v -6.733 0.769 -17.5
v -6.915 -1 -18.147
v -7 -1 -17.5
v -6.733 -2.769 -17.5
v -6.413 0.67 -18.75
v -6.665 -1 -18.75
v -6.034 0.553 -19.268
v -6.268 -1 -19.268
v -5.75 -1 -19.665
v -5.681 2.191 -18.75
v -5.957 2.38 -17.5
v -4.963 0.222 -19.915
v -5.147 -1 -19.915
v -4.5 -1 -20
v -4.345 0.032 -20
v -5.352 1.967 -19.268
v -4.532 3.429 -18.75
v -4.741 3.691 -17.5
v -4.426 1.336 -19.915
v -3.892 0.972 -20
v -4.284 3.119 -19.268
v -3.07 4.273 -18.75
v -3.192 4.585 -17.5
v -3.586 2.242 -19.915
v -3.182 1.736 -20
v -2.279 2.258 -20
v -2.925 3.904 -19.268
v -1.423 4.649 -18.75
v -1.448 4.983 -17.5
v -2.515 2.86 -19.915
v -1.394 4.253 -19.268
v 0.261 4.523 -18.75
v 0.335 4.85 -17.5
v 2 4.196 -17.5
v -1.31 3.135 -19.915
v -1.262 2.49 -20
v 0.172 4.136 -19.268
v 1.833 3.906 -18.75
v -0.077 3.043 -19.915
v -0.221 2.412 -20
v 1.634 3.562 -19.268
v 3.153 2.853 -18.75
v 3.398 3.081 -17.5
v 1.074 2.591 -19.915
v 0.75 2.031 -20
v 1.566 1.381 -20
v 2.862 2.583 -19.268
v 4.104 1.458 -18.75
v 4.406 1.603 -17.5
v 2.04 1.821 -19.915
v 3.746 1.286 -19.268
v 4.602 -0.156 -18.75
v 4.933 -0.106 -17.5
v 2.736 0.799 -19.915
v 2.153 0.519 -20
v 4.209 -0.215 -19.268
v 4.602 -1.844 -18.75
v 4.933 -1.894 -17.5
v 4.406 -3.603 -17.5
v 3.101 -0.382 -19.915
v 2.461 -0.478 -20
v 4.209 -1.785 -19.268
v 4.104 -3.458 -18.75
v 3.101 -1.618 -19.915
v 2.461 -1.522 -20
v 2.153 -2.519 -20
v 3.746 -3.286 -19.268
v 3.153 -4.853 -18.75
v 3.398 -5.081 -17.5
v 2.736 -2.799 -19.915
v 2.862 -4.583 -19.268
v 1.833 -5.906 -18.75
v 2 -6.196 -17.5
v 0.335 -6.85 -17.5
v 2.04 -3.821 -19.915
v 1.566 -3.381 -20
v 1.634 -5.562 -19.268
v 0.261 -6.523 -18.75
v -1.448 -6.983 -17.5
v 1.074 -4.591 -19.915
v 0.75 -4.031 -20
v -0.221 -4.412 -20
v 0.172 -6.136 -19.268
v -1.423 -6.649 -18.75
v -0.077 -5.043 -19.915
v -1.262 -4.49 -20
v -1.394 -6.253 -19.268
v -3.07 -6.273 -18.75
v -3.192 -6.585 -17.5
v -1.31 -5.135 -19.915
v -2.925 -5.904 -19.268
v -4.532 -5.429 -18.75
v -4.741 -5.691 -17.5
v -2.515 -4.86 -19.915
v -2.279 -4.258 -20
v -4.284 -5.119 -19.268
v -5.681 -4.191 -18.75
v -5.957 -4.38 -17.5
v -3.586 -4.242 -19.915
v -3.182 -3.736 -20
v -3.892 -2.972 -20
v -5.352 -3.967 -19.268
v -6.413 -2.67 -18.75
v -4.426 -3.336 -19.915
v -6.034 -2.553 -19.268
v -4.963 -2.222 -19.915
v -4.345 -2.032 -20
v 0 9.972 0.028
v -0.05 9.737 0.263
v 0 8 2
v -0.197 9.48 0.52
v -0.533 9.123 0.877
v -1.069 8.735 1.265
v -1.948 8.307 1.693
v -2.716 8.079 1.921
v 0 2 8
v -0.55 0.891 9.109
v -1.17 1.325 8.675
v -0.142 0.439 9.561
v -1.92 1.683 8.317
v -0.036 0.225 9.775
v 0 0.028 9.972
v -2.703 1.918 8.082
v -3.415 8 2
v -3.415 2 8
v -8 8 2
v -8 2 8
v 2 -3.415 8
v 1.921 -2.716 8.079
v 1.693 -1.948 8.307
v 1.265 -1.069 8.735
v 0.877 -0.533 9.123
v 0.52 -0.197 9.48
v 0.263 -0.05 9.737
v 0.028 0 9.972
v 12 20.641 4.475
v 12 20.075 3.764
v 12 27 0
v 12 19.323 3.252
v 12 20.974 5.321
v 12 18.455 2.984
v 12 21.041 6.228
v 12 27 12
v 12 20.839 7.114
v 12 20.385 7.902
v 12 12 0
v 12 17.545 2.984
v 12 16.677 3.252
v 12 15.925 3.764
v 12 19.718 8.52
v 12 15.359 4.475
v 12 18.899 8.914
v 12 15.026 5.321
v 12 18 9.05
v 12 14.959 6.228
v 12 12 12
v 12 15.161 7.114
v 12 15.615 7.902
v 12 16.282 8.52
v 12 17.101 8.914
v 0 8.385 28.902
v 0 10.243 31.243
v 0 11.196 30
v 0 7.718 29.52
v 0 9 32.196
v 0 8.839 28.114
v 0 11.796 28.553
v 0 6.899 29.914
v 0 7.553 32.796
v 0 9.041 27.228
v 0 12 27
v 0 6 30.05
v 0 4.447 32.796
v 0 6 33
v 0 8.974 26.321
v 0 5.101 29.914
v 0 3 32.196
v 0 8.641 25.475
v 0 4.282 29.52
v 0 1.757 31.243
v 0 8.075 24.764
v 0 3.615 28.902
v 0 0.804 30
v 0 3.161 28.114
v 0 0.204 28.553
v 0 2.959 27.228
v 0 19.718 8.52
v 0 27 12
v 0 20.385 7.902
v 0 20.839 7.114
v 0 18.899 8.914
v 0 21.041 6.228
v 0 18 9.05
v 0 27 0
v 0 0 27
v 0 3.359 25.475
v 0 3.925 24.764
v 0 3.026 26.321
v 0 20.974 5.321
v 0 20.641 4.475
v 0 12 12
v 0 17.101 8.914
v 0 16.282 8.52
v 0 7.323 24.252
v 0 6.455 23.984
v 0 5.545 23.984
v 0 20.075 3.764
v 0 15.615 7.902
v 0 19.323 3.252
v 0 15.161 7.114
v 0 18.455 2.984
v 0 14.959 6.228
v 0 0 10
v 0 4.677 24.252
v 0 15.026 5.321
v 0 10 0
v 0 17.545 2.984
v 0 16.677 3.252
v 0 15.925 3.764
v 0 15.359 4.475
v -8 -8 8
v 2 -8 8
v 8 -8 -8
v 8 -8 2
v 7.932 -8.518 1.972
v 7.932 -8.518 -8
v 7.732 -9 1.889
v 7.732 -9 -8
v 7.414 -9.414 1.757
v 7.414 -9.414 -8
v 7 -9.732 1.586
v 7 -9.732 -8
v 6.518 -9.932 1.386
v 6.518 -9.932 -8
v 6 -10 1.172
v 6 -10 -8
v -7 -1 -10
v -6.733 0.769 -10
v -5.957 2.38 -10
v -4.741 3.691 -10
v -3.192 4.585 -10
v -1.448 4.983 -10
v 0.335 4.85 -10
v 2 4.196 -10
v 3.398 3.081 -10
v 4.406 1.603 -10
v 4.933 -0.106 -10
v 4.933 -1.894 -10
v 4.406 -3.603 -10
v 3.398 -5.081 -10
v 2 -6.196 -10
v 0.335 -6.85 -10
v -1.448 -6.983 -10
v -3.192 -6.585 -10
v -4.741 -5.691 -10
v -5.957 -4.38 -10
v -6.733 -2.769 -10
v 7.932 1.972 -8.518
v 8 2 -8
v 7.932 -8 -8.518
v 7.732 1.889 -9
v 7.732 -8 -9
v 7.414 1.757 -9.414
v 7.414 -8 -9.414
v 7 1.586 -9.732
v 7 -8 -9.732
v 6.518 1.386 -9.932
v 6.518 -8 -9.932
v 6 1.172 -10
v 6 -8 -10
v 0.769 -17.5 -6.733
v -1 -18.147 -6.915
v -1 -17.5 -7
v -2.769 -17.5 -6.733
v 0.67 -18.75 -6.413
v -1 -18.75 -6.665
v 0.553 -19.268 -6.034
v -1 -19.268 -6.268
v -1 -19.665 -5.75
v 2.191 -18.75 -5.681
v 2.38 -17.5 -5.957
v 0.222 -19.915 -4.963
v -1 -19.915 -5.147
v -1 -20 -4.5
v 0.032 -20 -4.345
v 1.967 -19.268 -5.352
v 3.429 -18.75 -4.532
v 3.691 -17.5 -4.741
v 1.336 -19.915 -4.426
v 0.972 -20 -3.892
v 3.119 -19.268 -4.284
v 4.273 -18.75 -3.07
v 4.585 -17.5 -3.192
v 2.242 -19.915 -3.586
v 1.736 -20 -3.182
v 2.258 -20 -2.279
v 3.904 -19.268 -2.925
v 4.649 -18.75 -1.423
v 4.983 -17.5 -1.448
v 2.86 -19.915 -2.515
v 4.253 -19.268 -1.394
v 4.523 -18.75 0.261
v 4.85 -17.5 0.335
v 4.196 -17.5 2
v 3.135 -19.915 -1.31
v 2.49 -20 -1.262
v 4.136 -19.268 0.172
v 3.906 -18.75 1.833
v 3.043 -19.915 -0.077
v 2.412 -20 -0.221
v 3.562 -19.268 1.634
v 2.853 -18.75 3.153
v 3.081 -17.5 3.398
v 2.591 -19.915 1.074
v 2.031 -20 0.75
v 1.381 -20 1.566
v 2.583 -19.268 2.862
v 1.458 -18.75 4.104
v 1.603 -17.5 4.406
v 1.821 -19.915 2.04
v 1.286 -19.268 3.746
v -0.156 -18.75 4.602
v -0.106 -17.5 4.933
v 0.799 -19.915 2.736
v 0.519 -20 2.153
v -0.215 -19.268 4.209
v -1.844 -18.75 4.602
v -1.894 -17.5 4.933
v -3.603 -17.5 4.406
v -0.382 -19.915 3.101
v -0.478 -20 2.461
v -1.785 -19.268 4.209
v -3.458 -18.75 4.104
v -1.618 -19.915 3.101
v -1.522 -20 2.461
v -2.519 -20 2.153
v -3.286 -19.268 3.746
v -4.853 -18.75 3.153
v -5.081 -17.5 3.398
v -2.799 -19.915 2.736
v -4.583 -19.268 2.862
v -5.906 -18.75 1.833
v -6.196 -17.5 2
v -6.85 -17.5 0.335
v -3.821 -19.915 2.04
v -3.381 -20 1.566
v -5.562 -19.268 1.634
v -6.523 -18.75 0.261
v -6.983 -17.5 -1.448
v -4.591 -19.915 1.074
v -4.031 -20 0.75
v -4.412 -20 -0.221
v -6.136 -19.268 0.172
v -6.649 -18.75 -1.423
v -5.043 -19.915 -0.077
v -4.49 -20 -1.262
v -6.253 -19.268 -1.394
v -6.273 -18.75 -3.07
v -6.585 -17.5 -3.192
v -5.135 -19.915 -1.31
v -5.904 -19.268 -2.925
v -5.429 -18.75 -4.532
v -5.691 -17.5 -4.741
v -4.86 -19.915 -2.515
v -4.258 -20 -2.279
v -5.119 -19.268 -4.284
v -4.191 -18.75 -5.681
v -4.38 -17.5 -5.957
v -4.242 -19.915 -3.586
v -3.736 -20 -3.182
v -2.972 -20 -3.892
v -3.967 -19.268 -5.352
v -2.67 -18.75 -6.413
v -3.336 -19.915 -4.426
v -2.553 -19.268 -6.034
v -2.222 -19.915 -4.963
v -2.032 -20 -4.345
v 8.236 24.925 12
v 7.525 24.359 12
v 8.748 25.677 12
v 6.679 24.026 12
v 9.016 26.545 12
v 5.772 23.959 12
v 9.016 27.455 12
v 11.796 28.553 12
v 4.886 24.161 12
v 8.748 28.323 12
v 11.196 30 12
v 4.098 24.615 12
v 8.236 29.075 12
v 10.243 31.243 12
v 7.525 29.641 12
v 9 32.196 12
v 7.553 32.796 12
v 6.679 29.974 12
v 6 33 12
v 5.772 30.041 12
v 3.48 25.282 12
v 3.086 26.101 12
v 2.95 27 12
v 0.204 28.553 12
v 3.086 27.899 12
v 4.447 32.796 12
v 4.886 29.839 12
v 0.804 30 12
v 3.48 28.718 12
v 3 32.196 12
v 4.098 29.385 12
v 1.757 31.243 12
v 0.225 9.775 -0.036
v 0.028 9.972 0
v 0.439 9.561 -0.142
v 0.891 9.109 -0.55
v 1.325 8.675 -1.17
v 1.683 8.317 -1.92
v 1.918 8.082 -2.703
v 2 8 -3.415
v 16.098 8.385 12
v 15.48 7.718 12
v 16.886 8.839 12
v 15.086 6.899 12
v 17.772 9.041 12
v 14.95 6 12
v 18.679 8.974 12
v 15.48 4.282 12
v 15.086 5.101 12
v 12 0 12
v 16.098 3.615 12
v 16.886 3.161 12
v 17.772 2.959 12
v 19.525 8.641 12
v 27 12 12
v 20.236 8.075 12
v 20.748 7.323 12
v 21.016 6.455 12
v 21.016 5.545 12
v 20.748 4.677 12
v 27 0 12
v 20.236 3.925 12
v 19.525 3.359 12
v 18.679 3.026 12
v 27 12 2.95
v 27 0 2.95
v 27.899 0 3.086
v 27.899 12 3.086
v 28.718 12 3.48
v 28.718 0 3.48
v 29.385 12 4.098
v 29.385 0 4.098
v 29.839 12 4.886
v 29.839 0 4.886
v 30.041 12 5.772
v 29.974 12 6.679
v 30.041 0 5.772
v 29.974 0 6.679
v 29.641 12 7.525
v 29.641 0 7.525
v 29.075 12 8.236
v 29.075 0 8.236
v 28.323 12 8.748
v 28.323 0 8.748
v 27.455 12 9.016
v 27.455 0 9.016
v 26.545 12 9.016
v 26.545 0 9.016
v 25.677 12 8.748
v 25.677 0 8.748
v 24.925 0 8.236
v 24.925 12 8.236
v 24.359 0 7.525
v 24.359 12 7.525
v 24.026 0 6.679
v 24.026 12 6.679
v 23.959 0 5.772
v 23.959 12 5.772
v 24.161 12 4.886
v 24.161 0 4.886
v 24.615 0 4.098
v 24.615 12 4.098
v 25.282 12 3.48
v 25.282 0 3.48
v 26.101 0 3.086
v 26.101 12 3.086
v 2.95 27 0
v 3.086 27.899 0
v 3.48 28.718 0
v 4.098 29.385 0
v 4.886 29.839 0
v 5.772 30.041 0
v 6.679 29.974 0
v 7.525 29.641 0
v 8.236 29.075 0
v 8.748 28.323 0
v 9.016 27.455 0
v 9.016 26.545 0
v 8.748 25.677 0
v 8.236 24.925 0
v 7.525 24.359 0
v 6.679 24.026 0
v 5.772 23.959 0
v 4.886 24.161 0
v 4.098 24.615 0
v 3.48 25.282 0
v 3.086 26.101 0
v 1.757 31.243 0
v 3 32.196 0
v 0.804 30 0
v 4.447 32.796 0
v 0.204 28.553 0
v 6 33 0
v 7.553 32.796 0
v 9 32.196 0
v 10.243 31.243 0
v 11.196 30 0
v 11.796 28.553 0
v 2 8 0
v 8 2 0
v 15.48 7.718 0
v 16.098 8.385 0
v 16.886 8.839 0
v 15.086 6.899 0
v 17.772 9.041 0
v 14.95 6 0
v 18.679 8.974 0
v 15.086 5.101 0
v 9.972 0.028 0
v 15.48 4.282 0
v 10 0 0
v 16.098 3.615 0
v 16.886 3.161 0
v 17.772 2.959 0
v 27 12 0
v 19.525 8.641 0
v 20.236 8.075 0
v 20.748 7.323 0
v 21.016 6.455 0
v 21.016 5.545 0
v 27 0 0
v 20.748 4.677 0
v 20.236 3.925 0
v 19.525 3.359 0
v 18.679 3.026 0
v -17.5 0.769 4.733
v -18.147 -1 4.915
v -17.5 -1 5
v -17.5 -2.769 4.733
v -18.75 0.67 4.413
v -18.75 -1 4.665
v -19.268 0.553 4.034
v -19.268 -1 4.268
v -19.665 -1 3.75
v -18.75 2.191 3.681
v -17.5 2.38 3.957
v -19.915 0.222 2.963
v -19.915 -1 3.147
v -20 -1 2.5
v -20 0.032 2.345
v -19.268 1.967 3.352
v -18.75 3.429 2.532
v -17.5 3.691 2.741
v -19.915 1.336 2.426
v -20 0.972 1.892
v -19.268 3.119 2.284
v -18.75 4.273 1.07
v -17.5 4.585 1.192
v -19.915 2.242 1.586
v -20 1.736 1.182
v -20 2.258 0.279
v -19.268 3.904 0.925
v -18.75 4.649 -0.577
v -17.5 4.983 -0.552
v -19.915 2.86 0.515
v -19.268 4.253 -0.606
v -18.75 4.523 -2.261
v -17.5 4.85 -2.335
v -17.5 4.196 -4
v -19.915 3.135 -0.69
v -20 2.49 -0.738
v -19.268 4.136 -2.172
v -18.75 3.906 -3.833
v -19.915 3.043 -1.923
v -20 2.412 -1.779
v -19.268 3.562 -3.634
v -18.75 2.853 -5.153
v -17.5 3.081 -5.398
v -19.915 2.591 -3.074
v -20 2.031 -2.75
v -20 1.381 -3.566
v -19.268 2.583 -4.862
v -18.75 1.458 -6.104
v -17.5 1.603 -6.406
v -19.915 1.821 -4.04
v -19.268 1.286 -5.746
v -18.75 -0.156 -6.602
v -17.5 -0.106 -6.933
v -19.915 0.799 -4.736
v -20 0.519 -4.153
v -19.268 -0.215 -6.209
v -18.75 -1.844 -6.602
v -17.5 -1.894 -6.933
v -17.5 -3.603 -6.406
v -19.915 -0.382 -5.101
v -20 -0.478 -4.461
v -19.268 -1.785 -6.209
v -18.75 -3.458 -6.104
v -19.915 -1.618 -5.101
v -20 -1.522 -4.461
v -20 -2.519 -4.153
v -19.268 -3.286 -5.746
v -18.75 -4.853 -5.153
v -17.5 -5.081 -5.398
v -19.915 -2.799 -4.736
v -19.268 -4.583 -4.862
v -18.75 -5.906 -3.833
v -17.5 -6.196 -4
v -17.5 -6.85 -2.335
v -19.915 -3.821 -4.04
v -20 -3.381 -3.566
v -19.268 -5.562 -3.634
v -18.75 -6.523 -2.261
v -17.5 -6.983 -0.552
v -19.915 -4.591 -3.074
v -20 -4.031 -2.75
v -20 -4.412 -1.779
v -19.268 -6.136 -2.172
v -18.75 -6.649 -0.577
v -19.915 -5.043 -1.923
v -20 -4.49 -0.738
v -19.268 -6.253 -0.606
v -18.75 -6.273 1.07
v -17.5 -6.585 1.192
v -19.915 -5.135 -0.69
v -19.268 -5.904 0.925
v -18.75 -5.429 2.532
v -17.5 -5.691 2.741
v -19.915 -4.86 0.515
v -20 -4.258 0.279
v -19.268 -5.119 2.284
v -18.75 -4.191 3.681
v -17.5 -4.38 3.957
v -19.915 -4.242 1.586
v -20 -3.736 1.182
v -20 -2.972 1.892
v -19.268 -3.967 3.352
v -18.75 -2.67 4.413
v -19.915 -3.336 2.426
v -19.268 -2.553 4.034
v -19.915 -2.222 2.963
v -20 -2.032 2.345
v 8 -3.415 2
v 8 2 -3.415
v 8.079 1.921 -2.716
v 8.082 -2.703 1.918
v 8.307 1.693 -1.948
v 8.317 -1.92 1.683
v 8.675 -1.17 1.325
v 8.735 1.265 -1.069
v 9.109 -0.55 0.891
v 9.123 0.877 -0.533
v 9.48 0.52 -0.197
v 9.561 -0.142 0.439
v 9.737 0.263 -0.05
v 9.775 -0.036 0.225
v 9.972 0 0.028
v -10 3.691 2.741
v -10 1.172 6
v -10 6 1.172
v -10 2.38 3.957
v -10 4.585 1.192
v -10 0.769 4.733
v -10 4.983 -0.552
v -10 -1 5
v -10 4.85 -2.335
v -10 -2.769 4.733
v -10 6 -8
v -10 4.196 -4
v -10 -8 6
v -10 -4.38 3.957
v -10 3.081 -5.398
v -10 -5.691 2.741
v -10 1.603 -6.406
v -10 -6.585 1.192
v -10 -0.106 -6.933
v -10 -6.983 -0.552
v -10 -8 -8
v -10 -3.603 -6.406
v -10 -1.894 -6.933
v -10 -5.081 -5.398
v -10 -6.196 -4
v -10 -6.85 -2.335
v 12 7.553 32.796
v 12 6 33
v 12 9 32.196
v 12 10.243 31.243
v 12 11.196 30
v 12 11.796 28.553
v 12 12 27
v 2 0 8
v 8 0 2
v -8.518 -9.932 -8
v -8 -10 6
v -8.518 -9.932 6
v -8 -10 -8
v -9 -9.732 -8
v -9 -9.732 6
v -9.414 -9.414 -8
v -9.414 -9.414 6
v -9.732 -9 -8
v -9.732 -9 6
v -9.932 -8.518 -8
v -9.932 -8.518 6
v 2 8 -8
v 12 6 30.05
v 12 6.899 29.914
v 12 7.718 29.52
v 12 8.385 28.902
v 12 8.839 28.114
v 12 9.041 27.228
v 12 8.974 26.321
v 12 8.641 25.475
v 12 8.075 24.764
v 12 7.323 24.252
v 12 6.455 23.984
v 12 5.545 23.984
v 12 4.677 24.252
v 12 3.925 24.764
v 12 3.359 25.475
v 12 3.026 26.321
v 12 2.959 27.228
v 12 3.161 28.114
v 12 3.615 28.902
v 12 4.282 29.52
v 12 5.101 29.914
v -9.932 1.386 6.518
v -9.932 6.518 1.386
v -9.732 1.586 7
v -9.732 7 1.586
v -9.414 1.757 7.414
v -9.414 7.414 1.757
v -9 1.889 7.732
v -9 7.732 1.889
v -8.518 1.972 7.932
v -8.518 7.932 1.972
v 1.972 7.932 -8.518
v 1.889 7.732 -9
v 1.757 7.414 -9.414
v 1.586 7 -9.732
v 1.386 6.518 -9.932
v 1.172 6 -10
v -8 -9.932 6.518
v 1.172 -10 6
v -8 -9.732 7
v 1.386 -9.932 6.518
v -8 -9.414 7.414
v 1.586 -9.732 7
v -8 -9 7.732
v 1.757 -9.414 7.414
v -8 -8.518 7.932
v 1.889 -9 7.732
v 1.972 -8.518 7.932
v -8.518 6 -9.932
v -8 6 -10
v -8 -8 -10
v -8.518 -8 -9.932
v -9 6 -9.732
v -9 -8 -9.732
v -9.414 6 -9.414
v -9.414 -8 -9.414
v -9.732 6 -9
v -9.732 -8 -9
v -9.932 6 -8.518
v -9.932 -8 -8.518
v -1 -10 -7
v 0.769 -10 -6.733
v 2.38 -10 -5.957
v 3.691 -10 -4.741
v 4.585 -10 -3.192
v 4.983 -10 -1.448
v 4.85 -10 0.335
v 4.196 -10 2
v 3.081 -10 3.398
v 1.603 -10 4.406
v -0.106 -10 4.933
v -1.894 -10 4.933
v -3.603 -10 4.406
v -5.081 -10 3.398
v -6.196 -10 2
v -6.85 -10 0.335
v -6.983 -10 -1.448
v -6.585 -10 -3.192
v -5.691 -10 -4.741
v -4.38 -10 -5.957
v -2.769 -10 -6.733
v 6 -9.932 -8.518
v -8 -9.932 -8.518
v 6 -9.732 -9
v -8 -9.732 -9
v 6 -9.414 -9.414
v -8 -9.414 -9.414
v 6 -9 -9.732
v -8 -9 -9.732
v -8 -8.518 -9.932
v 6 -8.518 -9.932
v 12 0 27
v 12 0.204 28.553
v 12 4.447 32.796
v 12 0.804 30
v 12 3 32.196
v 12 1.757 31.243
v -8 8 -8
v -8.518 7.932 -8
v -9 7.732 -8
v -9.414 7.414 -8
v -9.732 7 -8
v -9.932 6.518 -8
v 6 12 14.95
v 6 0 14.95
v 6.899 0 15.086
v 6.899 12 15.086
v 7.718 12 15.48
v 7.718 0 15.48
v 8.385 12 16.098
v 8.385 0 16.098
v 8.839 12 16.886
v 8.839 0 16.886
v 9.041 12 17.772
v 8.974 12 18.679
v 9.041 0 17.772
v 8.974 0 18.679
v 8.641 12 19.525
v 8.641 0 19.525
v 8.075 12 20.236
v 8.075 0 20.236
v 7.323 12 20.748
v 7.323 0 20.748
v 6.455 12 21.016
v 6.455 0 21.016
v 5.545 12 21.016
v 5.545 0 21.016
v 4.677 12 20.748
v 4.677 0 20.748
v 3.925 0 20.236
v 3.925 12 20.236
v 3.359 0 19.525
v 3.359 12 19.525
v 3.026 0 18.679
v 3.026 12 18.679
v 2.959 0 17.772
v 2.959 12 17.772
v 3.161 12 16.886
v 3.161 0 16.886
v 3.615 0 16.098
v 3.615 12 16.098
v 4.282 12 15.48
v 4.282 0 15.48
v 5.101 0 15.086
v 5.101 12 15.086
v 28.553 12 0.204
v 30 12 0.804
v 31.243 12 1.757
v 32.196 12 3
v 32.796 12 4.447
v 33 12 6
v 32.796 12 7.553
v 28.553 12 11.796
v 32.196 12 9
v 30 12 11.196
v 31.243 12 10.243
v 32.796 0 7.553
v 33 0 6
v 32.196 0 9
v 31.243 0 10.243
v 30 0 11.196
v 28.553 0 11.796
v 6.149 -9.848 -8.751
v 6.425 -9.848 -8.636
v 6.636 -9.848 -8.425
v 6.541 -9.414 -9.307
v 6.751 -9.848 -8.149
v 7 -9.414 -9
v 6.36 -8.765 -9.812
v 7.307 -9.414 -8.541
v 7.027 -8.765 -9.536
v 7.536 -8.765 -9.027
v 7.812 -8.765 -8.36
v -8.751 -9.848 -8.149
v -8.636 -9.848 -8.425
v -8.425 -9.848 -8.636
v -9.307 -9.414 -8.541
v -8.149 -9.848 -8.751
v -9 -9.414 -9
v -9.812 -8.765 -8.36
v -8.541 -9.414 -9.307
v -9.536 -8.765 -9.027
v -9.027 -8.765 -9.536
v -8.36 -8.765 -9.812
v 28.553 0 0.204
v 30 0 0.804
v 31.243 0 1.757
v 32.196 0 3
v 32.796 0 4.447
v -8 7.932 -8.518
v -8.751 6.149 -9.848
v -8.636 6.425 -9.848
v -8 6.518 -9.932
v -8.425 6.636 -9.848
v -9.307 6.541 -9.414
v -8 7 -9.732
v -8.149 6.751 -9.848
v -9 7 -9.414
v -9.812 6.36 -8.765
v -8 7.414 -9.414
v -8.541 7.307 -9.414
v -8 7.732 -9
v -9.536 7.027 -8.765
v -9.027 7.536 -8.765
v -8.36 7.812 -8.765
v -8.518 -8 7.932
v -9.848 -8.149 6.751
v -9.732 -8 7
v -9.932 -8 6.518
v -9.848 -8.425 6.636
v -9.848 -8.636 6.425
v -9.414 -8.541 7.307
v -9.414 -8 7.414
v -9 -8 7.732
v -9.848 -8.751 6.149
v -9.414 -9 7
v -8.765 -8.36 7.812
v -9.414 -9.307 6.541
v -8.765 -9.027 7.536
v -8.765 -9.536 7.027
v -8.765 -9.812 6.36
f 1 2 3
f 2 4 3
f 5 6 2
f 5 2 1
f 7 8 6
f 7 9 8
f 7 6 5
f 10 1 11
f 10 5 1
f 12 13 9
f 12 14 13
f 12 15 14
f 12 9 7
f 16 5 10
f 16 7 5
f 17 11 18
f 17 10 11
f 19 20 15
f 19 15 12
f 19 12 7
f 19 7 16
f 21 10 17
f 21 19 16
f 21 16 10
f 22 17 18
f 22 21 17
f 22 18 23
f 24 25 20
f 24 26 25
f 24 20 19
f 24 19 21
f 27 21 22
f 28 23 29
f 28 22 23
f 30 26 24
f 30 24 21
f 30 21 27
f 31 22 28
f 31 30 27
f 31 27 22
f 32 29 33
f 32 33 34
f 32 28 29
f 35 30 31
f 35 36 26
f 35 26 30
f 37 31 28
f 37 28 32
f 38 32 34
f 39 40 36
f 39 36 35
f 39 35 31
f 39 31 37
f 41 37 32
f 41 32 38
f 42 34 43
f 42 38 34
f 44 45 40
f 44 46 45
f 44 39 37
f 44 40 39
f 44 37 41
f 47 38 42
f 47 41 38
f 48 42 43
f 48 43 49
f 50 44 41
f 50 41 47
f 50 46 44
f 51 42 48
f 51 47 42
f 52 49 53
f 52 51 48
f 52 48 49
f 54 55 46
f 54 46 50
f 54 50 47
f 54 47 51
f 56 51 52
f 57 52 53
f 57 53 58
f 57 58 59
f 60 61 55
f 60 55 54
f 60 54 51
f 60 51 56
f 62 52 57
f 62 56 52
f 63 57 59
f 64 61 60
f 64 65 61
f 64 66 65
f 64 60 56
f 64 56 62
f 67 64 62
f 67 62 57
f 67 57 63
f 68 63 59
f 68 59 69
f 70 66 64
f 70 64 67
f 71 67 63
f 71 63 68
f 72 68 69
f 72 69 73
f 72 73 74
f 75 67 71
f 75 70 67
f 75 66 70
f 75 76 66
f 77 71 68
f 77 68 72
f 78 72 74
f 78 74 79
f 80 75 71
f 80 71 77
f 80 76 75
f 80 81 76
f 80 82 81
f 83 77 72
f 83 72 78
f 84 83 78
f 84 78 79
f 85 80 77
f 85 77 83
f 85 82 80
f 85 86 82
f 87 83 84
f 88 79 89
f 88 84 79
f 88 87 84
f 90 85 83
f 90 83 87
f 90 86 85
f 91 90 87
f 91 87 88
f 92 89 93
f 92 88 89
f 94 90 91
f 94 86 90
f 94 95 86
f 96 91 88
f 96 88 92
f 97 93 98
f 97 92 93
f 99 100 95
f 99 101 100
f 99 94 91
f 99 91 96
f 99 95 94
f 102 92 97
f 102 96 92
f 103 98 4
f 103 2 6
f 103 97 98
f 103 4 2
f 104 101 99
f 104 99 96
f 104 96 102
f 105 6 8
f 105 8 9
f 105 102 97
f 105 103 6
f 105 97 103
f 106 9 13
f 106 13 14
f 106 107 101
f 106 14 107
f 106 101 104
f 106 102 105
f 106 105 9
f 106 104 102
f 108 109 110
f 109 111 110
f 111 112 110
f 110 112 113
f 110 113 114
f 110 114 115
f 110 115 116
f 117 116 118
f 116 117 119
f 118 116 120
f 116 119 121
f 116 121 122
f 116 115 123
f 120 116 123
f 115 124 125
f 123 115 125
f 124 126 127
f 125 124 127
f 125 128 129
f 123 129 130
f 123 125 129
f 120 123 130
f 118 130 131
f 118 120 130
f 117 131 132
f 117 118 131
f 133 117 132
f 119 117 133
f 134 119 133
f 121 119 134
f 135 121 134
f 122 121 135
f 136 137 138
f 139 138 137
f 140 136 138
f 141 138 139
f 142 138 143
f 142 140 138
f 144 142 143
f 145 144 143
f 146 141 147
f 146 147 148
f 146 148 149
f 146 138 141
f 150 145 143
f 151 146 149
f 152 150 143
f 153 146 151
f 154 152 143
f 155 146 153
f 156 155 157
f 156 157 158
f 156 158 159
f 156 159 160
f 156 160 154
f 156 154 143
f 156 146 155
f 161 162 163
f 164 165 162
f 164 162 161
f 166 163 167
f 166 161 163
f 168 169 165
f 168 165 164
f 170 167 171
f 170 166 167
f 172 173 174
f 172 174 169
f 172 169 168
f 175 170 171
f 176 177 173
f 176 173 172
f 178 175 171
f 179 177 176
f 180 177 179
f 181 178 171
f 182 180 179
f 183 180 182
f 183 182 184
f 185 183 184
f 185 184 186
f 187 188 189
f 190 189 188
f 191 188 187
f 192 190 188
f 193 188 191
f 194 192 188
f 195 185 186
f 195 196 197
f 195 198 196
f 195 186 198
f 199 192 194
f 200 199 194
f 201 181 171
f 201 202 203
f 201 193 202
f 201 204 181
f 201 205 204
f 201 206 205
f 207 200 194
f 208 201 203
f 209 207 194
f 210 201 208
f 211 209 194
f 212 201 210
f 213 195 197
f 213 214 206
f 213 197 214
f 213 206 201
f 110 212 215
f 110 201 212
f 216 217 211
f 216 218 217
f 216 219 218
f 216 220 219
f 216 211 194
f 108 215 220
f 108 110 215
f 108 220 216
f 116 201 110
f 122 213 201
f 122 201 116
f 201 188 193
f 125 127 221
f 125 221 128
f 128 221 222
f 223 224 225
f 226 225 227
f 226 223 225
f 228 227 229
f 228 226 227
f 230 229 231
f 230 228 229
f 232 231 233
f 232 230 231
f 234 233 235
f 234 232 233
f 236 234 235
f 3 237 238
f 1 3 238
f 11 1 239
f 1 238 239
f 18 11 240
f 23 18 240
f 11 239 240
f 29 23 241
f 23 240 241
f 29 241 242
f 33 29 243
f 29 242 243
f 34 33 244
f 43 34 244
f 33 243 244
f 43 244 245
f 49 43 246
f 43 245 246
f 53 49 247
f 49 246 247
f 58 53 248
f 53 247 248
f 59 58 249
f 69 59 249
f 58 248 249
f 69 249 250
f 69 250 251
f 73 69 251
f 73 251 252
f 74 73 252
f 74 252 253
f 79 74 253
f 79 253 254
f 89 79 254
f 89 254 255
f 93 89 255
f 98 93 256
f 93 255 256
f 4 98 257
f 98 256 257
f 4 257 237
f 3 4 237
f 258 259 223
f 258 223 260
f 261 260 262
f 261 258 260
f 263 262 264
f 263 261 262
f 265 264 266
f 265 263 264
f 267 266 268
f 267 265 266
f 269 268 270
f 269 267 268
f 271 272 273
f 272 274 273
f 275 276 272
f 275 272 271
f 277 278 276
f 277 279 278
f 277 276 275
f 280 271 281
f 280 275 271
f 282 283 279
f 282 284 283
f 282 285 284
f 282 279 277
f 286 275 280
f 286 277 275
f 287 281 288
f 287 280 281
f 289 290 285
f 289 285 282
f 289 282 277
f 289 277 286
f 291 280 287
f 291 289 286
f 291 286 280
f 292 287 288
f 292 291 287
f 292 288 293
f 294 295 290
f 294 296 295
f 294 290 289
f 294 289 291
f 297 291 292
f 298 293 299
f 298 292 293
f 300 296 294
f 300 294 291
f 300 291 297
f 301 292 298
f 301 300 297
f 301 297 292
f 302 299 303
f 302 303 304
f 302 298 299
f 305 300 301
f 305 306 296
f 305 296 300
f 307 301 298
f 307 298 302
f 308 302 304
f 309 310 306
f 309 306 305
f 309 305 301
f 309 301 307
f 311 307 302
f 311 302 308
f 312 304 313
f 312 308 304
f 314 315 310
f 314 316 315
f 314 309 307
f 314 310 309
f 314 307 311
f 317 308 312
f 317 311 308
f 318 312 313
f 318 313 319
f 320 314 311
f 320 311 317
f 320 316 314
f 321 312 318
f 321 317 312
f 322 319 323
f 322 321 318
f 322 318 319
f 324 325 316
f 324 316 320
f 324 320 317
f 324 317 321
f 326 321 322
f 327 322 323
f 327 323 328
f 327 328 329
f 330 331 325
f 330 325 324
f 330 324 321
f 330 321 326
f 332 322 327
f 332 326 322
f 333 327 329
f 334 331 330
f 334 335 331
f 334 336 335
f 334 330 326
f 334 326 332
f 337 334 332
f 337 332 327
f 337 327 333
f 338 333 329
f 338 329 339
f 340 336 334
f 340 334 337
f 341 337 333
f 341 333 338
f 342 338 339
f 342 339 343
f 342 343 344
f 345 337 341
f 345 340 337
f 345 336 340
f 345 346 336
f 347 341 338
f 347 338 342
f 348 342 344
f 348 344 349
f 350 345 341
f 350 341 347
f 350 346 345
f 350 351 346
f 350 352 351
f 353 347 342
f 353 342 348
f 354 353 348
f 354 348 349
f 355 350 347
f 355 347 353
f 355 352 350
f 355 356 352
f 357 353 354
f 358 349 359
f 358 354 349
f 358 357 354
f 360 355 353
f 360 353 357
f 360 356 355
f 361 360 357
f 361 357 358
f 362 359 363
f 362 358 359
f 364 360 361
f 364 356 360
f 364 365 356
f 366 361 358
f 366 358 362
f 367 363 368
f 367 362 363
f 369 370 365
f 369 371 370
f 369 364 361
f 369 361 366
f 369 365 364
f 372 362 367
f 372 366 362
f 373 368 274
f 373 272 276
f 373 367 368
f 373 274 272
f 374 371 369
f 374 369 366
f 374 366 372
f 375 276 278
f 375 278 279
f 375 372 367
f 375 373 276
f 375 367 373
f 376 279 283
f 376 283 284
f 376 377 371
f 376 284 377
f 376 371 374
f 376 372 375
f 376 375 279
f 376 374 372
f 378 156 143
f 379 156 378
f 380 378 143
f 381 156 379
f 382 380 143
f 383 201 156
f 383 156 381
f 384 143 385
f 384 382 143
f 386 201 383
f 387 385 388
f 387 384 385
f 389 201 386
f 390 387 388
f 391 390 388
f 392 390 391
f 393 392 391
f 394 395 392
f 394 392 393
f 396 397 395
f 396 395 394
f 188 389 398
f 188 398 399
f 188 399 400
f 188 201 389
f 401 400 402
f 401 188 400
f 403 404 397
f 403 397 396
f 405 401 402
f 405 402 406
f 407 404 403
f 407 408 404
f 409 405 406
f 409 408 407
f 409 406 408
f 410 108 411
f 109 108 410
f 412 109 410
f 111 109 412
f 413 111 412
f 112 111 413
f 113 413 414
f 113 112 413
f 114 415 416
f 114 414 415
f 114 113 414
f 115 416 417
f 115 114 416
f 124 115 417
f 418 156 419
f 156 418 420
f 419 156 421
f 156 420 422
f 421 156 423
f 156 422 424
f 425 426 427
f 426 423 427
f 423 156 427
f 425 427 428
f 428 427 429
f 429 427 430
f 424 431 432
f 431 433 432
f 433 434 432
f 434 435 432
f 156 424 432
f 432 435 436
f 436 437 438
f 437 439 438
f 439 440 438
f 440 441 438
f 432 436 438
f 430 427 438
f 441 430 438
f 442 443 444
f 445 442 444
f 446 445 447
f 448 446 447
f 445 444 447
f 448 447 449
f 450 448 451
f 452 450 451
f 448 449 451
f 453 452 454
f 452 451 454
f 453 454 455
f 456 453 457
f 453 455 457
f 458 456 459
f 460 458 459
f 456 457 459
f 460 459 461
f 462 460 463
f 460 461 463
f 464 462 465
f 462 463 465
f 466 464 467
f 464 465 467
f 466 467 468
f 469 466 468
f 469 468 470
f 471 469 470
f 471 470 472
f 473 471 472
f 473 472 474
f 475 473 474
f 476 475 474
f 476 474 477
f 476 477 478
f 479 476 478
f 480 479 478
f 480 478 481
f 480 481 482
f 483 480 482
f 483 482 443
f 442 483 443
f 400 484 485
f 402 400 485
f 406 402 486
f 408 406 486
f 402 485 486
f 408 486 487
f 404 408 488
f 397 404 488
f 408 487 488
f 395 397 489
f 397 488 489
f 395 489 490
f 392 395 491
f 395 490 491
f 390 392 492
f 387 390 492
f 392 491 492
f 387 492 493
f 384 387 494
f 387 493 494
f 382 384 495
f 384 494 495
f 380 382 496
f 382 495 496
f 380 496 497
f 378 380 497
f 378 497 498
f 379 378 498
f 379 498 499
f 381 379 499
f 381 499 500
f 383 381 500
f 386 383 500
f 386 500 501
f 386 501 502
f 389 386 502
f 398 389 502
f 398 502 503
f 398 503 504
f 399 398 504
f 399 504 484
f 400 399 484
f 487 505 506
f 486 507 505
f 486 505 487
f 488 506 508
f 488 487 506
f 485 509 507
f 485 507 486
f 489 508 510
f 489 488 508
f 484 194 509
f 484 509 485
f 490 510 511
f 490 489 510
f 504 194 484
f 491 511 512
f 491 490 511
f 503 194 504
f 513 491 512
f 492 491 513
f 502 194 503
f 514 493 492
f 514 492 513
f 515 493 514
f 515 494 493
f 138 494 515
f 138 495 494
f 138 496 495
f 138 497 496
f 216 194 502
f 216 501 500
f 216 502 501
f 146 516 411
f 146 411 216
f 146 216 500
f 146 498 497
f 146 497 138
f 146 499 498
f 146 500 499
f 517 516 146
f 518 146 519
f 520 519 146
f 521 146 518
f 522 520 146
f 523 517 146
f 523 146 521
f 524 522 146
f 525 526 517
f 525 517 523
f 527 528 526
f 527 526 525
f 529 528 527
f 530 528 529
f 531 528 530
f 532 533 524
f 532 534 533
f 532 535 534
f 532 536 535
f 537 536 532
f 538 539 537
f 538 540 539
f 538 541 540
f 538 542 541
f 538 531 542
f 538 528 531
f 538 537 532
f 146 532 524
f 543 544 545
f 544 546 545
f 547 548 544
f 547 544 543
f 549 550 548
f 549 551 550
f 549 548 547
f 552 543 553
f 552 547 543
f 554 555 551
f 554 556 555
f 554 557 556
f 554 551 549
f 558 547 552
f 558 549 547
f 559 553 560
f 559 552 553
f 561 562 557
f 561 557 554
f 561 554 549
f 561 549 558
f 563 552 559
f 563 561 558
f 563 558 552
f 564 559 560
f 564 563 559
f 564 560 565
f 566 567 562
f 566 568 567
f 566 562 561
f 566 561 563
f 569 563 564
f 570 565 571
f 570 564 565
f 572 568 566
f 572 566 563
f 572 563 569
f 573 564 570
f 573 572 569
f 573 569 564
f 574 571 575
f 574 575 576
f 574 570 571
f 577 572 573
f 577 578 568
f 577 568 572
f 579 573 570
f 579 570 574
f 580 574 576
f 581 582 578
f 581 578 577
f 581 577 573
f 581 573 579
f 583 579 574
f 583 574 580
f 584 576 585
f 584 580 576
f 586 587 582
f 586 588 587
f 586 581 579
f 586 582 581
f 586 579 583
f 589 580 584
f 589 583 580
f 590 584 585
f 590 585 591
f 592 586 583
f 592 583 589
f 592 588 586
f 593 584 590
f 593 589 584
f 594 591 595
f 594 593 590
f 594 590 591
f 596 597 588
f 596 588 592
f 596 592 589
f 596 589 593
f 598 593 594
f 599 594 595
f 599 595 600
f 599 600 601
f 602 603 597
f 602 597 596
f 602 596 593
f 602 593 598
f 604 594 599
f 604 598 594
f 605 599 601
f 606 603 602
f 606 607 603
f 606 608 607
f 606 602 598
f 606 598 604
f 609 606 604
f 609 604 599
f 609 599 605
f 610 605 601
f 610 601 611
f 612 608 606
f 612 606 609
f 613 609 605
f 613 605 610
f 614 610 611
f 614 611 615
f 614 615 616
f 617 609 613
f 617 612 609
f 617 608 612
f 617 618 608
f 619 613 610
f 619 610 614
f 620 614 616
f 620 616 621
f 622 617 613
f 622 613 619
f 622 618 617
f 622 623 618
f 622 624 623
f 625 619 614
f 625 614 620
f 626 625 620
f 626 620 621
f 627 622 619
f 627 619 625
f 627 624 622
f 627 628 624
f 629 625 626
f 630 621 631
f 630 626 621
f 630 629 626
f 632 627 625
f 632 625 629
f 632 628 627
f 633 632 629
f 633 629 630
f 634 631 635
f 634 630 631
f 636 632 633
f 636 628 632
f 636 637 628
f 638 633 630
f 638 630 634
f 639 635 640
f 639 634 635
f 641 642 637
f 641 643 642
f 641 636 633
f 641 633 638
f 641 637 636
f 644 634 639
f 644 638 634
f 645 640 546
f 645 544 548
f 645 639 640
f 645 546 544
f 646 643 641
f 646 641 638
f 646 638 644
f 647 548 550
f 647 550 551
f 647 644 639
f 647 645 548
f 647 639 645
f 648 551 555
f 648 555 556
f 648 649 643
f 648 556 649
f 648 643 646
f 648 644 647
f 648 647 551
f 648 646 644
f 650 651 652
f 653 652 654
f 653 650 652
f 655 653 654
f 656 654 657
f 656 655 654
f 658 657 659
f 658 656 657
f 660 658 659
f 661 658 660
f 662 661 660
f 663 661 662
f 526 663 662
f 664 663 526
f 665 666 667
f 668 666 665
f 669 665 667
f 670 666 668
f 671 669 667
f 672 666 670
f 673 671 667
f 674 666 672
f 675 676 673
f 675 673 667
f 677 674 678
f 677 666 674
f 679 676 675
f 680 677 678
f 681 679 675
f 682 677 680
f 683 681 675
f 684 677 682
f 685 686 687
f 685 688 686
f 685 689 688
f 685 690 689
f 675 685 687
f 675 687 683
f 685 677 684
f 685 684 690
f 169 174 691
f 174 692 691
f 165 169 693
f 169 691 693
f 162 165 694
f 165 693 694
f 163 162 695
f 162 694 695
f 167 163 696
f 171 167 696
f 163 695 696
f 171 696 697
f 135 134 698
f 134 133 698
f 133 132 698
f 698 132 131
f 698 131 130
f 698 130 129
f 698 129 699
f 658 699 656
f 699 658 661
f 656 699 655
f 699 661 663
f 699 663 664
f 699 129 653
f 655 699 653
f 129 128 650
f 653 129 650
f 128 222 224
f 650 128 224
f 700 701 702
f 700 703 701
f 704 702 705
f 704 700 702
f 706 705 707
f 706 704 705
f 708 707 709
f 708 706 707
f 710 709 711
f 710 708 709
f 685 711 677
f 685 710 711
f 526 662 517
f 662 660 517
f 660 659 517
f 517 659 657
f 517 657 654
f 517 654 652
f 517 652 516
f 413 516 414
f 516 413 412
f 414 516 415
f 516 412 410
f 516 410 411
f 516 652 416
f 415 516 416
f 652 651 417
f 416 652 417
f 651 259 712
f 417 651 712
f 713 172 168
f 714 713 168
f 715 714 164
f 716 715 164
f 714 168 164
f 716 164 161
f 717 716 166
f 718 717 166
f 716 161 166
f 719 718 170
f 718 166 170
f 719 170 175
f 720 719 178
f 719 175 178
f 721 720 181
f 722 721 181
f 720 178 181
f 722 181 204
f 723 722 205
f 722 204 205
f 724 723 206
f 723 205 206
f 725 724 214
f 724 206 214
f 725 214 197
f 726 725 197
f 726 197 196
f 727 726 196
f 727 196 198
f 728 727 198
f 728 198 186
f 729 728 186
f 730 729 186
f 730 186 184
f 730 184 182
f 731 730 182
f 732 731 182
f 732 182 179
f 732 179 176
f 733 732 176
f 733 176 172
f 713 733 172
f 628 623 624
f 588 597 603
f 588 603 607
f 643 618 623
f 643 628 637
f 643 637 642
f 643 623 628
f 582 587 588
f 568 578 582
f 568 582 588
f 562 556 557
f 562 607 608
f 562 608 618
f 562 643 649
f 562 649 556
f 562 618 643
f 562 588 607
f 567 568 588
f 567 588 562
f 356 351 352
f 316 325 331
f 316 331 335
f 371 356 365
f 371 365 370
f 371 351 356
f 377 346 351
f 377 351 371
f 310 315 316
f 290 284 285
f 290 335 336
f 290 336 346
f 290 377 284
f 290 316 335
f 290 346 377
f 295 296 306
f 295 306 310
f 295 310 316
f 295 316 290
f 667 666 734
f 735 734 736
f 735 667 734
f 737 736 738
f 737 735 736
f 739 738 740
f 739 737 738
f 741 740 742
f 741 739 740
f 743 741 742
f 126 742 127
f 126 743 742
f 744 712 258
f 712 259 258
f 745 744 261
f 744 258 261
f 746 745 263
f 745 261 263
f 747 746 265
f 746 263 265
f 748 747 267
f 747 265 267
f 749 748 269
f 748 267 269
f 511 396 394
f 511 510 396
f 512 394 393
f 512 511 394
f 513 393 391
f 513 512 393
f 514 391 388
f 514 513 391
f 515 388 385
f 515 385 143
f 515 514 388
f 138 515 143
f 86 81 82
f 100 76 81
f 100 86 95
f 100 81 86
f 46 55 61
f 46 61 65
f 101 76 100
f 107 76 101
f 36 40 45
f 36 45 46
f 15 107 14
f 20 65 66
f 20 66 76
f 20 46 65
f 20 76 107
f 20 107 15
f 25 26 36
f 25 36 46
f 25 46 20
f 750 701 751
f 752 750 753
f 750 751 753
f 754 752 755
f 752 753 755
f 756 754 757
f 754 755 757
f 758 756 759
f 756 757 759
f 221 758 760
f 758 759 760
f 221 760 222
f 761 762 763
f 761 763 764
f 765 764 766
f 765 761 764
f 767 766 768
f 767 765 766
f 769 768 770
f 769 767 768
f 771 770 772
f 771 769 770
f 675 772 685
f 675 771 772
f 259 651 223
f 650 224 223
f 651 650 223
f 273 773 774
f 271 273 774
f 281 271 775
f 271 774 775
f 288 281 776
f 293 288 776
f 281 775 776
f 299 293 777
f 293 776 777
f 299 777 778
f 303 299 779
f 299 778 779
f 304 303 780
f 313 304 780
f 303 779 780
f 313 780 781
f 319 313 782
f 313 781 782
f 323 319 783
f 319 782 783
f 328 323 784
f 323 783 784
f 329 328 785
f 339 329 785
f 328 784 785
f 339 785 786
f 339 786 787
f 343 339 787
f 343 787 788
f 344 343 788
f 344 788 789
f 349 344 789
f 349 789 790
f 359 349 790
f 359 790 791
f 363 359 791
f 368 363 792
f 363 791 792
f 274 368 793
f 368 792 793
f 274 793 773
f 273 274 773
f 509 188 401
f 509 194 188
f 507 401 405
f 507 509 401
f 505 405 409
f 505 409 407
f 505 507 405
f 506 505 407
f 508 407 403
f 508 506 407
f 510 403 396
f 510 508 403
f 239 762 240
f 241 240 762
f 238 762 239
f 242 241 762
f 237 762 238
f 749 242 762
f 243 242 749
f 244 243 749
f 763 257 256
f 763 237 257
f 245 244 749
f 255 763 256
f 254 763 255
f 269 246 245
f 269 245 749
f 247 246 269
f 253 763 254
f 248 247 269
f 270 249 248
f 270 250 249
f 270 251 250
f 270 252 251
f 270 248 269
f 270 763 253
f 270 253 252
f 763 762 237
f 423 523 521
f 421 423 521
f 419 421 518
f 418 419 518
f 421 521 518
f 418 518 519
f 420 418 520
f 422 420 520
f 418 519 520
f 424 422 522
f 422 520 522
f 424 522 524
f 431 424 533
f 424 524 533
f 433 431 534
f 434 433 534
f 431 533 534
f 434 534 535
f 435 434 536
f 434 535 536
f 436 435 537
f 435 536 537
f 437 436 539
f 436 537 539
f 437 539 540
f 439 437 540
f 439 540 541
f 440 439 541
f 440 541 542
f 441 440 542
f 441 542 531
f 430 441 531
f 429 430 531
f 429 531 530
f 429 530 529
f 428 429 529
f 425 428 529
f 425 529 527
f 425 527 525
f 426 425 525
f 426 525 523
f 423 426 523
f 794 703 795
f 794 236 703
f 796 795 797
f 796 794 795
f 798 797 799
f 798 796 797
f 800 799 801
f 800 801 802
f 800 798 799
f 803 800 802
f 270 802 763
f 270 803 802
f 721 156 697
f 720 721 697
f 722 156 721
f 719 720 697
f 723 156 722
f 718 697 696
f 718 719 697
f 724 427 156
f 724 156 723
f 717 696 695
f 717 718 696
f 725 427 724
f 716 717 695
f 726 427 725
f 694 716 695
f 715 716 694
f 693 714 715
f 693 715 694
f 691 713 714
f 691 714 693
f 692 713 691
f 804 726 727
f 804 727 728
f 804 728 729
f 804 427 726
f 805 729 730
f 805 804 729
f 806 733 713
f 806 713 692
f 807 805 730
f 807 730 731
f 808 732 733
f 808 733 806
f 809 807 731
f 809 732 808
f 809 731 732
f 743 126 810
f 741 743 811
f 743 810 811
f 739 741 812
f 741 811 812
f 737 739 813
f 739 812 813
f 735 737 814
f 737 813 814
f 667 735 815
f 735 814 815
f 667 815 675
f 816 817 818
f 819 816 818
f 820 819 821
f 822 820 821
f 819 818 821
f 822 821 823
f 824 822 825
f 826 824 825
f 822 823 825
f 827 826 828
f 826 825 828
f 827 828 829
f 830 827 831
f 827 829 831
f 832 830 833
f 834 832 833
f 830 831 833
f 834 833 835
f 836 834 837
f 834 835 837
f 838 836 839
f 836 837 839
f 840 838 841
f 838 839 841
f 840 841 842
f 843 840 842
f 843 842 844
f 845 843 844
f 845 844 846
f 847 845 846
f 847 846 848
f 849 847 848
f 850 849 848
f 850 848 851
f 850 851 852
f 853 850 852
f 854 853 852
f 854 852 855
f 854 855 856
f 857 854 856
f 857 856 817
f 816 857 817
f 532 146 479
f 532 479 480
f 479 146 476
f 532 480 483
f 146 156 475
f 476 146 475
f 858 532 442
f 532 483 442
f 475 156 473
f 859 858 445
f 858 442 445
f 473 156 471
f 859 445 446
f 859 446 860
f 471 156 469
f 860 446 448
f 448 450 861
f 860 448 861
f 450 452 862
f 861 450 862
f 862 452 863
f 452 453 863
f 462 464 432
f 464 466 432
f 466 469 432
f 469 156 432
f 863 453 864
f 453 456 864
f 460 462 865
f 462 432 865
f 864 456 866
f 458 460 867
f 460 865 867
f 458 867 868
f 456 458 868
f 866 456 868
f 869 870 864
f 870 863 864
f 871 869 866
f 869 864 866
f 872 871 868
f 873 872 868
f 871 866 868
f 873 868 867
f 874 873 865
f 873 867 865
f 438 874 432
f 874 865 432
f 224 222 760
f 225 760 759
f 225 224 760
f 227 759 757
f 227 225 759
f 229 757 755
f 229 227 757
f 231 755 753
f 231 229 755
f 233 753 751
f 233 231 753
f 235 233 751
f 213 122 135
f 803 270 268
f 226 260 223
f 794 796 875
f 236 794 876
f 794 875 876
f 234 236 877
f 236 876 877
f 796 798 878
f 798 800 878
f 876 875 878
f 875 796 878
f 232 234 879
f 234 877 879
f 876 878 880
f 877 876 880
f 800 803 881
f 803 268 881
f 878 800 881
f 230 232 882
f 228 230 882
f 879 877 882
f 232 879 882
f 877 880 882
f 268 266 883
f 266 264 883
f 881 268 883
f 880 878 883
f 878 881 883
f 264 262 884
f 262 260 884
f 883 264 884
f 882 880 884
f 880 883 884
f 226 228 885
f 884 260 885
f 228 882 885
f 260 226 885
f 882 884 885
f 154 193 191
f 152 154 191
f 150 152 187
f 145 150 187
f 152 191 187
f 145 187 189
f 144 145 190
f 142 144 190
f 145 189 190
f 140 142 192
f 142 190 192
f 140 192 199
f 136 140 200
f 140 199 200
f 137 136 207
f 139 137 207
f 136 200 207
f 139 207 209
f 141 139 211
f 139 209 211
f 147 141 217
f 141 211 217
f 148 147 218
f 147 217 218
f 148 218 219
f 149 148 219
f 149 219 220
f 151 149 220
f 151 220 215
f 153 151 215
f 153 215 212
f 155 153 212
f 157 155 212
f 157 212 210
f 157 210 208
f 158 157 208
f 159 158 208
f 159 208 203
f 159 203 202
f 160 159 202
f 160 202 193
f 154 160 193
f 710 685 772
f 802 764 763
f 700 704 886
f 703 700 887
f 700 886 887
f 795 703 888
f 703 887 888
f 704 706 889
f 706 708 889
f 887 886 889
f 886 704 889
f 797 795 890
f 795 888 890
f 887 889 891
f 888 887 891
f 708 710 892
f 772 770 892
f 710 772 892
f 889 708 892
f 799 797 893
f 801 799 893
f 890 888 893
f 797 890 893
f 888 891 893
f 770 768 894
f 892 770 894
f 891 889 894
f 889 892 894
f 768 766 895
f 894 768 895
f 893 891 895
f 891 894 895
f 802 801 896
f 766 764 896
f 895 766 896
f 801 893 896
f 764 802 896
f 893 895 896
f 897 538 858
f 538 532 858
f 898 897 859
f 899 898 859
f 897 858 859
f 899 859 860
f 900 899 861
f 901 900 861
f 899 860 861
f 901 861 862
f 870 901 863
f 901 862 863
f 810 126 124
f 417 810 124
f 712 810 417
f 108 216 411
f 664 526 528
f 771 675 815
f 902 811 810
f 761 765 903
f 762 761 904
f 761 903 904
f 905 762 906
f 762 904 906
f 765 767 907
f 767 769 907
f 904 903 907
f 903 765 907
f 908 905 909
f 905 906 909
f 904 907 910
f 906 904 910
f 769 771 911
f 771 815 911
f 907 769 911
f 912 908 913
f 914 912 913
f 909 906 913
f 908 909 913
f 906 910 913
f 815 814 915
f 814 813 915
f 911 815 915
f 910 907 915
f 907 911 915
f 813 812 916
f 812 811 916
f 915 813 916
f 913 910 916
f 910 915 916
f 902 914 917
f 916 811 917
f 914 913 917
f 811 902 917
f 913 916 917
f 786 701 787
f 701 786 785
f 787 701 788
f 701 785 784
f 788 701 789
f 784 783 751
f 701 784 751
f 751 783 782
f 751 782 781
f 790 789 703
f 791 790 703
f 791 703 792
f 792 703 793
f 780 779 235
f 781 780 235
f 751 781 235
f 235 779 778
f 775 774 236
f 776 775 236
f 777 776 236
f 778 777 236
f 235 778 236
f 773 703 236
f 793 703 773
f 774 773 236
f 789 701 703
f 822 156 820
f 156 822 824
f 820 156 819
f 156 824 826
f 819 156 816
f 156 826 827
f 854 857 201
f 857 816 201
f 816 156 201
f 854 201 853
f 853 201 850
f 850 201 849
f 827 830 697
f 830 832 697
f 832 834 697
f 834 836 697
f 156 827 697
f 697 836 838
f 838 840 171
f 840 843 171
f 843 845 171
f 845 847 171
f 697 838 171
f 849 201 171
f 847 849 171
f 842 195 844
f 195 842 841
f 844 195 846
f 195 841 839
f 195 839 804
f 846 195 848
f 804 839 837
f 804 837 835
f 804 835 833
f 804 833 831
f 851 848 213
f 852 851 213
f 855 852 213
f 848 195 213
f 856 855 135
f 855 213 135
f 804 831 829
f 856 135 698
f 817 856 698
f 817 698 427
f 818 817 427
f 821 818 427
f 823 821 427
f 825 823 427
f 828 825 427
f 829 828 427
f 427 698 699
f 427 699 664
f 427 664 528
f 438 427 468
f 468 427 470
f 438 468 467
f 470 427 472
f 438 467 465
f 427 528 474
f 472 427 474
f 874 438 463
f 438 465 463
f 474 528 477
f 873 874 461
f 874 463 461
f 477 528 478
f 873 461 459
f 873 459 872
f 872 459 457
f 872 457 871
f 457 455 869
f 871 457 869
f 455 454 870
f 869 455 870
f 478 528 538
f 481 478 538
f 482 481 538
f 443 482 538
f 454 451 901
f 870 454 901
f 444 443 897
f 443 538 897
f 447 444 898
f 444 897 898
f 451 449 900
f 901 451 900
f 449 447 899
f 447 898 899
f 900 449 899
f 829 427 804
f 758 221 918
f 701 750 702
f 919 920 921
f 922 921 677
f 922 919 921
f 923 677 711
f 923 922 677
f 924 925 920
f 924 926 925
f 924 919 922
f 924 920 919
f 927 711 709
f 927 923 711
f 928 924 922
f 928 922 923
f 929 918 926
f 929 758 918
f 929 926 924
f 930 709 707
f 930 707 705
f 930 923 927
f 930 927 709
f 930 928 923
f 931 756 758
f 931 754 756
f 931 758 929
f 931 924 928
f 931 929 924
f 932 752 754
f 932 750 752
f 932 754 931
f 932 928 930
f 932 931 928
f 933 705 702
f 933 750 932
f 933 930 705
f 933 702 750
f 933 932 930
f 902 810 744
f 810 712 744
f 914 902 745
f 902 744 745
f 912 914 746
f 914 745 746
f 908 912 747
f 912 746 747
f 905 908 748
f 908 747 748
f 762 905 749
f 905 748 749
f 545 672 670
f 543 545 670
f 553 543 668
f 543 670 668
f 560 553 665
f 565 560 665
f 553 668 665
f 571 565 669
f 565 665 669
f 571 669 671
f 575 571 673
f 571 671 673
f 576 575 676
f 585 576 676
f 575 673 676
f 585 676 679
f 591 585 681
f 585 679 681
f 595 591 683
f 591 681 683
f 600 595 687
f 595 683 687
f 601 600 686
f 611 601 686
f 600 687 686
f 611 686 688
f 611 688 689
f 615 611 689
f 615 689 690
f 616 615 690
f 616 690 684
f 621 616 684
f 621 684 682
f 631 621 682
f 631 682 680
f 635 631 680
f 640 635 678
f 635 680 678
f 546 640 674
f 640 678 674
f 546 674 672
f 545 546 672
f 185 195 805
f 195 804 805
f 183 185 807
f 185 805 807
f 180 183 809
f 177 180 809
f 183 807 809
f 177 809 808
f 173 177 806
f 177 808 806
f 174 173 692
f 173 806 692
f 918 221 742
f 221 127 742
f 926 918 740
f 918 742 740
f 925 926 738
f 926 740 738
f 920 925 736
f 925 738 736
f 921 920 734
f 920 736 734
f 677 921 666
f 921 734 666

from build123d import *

# Parameters (mm, degrees)
SKETCH1_W                = 33
SKETCH1_H                = 33
BOSS_EXTRUDE1_DEPTH      = 33
SKETCH2_W                = 21
SKETCH2_H                = 21
CUT_EXTRUDE1_DEPTH       = 58.15767665
SKETCH3_W                = 21
SKETCH3_H                = 21
CUT_EXTRUDE2_DEPTH       = 58.15767665
SKETCH4_W                = 21
SKETCH4_H                = 21
CUT_EXTRUDE3_DEPTH       = 58.15767665
SKETCH5_R                = 3.05
CUT_EXTRUDE4_DEPTH       = 58.15767665
SKETCH6_R                = 3.05
CUT_EXTRUDE5_DEPTH       = 58.15767665
SKETCH7_R                = 3.05
CUT_EXTRUDE6_DEPTH       = 58.15767665
FILLET1_R                = 6
CHAMFER1_START           = -1
CHAMFER1_OUTLINE_W       = 16
CHAMFER1_OUTLINE_H       = 18
CHAMFER1_DEPTH           = 6.773502692
BOSS_EXTRUDE3_DEPTH      = 8
BOSS_EXTRUDE3_DEPTH_BACK = 10
SKETCH9_W                = 18
SKETCH9_H                = 18
CHAMFER2_SIZE            = 6
FILLET2_R                = 1.25
SKETCH10_R               = 6
BOSS_EXTRUDE4_DEPTH      = 10
SKETCH11_R               = 6
BOSS_EXTRUDE5_DEPTH      = 10
SKETCH12_R               = 6
BOSS_EXTRUDE6_DEPTH      = 10
FILLET3_R                = 2
FILLET4_R                = 2.5


with BuildPart() as part:
    # Sketch1 → Boss-Extrude1 (new body)
    with BuildSketch(Plane(origin=(0, 0, 0), x_dir=(1, 0, 0), z_dir=(0, 1, 0))):
        with Locations((16.5, -16.5)):
            Rectangle(SKETCH1_W, SKETCH1_H)
    extrude(amount=BOSS_EXTRUDE1_DEPTH)

    # Sketch2 → Cut-Extrude1 (cut, through all)
    with BuildSketch(Plane.XY.offset(33)):
        with Locations((22.5, 22.5)):
            Rectangle(SKETCH2_W, SKETCH2_H)
    extrude(amount=-CUT_EXTRUDE1_DEPTH, mode=Mode.SUBTRACT)

    # Sketch3 → Cut-Extrude2 (cut, through all)
    with BuildSketch(Plane.XZ):
        with Locations((22.5, 22.5)):
            Rectangle(SKETCH3_W, SKETCH3_H)
    extrude(amount=-CUT_EXTRUDE2_DEPTH, mode=Mode.SUBTRACT)

    # Sketch4 → Cut-Extrude3 (cut, through all)
    with BuildSketch(Plane.ZY):
        with Locations((22.5, 22.5)):
            Rectangle(SKETCH4_W, SKETCH4_H)
    extrude(amount=-CUT_EXTRUDE3_DEPTH, mode=Mode.SUBTRACT)

    # Sketch5 → Cut-Extrude4 (cut, through all)
    with BuildSketch(Plane.ZY):
        with Locations((27, 6)):
            Circle(SKETCH5_R)
        with Locations((6, 18)):
            Circle(SKETCH5_R)
    extrude(amount=-CUT_EXTRUDE4_DEPTH, mode=Mode.SUBTRACT)

    # Sketch6 → Cut-Extrude5 (cut, through all)
    with BuildSketch(Plane.XZ):
        with Locations(Location((6, 18, 0), (0, 0, 270))):
            Circle(SKETCH6_R)
        with Locations(Location((27, 6, 0), (0, 0, 270))):
            Circle(SKETCH6_R)
    extrude(amount=-CUT_EXTRUDE5_DEPTH, mode=Mode.SUBTRACT)

    # Sketch7 → Cut-Extrude6 (cut, through all)
    with BuildSketch(Plane(origin=(0, 0, 0), x_dir=(-1, 0, 0), z_dir=(0, 0, -1))):
        with Locations((-18, 6)):
            Circle(SKETCH7_R)
        with Locations((-6, 27)):
            Circle(SKETCH7_R)
    extrude(amount=-CUT_EXTRUDE6_DEPTH, mode=Mode.SUBTRACT)

    # Fillet1
    fillet1_edges = [part.edges().sort_by_distance(p)[0] for p in [
        (12, 33, 6),
        (0, 33, 6),
        (6, 12, 33),
        (6, 0, 33),
        (33, 6, 0),
        (33, 6, 12),
    ]]
    fillet(fillet1_edges, radius=FILLET1_R - 0.0001)  # a hair under: the kernel refuses the full size

    # Chamfer1: read off the stored shape, not the designer's step
    # Chamfer1 outline → Chamfer1 (cut)
    with BuildSketch(Plane(origin=(0, 0, 0), x_dir=(0.8164965809277258, -0.40824829046386313, -0.40824829046386313), z_dir=(0.5773502691896258, 0.5773502691896258, 0.5773502691896258)).offset(CHAMFER1_START)):
        with Locations((2, 0)):
            Rectangle(CHAMFER1_OUTLINE_W, CHAMFER1_OUTLINE_H)
    extrude(amount=CHAMFER1_DEPTH, mode=Mode.SUBTRACT)

    # Sketch9 → Boss-Extrude3 (add, two sides: drawn at the far end of the back side and taken through both)
    with BuildSketch(Plane(origin=(0, 0, 0), x_dir=(1, 0, 0), z_dir=(0, 1, 0)).offset(-BOSS_EXTRUDE3_DEPTH_BACK)):
        with Locations((-1, 1)):
            Rectangle(SKETCH9_W, SKETCH9_H)
    extrude(amount=BOSS_EXTRUDE3_DEPTH + BOSS_EXTRUDE3_DEPTH_BACK)

    # Chamfer2
    chamfer2_edges = [part.edges().sort_by_distance(p)[0] for p in [
        (8, -5, 8),
        (8, 8, -5),
        (-5, 8, 8),
    ]]
    chamfer(chamfer2_edges, length=CHAMFER2_SIZE)

    # Fillet2
    # the kernel refuses this fillet: 1.25 mm, written as the material it adds along each edge
    with BuildSketch(Plane(origin=(-4.268829387, 8, 6.268829387), x_dir=(-0.408248290463863, 0.816496580927726, -0.408248290463863), z_dir=(0.7071067811865476, 0, -0.7071067811865476))) as fillet2_piece_1_section:
        with BuildLine():
            CenterArc((FILLET2_R * 1.93185165258, -FILLET2_R), FILLET2_R, 90, 125.264389683)
            Line((FILLET2_R * 1.11535507165, -FILLET2_R * 1.57735026919), (0, 0))
            Line((0, 0), (FILLET2_R * 1.93185165258, 0))
        make_face()
    fillet2_piece_1 = extrude(amount=14.902499954, mode=Mode.PRIVATE)
    fillet2_piece_1 = split(fillet2_piece_1, bisect_by=Plane(origin=(-1.134414693, 11.134414693, 6.268829387), z_dir=(-0.7071067811865476, -0.7071067811865476, 0)), keep=Keep.TOP, mode=Mode.PRIVATE)
    fillet2_piece_1 = split(fillet2_piece_1, bisect_by=Plane(origin=(-4.268829387, 5.865585306, 4.134414694), z_dir=(0, -0.7071067811865476, -0.7071067811865476)), keep=Keep.TOP, mode=Mode.PRIVATE)
    add(fillet2_piece_1)
    with BuildSketch(Plane(origin=(-4.268829387, 6.268829387, 8), x_dir=(-0.4082482904638628, -0.4082482904638628, 0.8164965809277263), z_dir=(0.7071067811865476, -0.7071067811865476, 0))) as fillet2_piece_2_section:
        with BuildLine():
            CenterArc((FILLET2_R * 1.93185165258, FILLET2_R), FILLET2_R, 144.735610317, 125.264389683)
            Line((FILLET2_R * 1.11535507165, FILLET2_R * 1.57735026919), (0, 0))
            Line((0, 0), (FILLET2_R * 1.93185165258, 0))
        make_face()
    fillet2_piece_2 = extrude(amount=14.902499954, mode=Mode.PRIVATE)
    fillet2_piece_2 = split(fillet2_piece_2, bisect_by=Plane(origin=(-4.268829387, 4.134414694, 5.865585306), z_dir=(0, -0.7071067811865476, -0.7071067811865476)), keep=Keep.TOP, mode=Mode.PRIVATE)
    fillet2_piece_2 = split(fillet2_piece_2, bisect_by=Plane(origin=(-1.134414693, 6.268829387, 11.134414693), z_dir=(-0.7071067811865476, 0, -0.7071067811865475)), keep=Keep.TOP, mode=Mode.PRIVATE)
    add(fillet2_piece_2)
    with BuildSketch(Plane(origin=(8, -4.268829387, 6.268829387), x_dir=(0.8164965809277257, -0.40824829046386313, -0.4082482904638633), z_dir=(0, 0.7071067811865476, -0.7071067811865475))) as fillet2_piece_3_section:
        with BuildLine():
            CenterArc((FILLET2_R * 1.93185165258, FILLET2_R), FILLET2_R, 144.735610317, 125.264389683)
            Line((FILLET2_R * 1.11535507165, FILLET2_R * 1.57735026919), (0, 0))
            Line((0, 0), (FILLET2_R * 1.93185165258, 0))
        make_face()
    fillet2_piece_3 = extrude(amount=14.902499954, mode=Mode.PRIVATE)
    fillet2_piece_3 = split(fillet2_piece_3, bisect_by=Plane(origin=(11.134414693, -1.134414693, 6.268829387), z_dir=(-0.7071067811865476, -0.7071067811865476, 0)), keep=Keep.TOP, mode=Mode.PRIVATE)
    fillet2_piece_3 = split(fillet2_piece_3, bisect_by=Plane(origin=(5.865585306, -4.268829387, 4.134414694), z_dir=(-0.7071067811865476, 0, -0.7071067811865475)), keep=Keep.TOP, mode=Mode.PRIVATE)
    add(fillet2_piece_3)

    # Sketch10 → Boss-Extrude4 (add)
    with BuildSketch(Plane.XZ.offset(10)):
        with Locations(Location((-1, -1, 0), (0, 0, 270))):
            Circle(SKETCH10_R)
    extrude(amount=BOSS_EXTRUDE4_DEPTH)

    # Sketch11 → Boss-Extrude5 (add)
    with BuildSketch(Plane.ZY.offset(10)):
        with Locations((-1, -1)):
            Circle(SKETCH11_R)
    extrude(amount=BOSS_EXTRUDE5_DEPTH)

    # Sketch12 → Boss-Extrude6 (add)
    with BuildSketch(Plane(origin=(0, 0, -10), x_dir=(-1, 0, 0), z_dir=(0, 0, -1))):
        with Locations((1, -1)):
            Circle(SKETCH12_R)
    extrude(amount=BOSS_EXTRUDE6_DEPTH)

    # Fillet3
    fillet3_edges = [part.edges().sort_by_distance(p)[0] for p in [
        (8, -4, -10),
        (-4, -10, 8),
        (-10, 8, -4),
        (-10, -1, -10),
        (-4, 8, -10),
        (-10, -4, 8),
        (-10, -10, -1),
        (-1, -10, -10),
        (8, -10, -4),
        (5, -10, 5),
        (5, 5, -10),
        (-10, 5, 5),
    ]]
    fillet(fillet3_edges, radius=FILLET3_R)

    # Fillet4
    fillet4_edges = [part.edges().sort_by_distance(p)[0] for p in [
        (-1, -20, 5),
        (-20, -1, -7),
        (5, -1, -20),
    ]]
    fillet(fillet4_edges, radius=FILLET4_R)


solid = part.part
